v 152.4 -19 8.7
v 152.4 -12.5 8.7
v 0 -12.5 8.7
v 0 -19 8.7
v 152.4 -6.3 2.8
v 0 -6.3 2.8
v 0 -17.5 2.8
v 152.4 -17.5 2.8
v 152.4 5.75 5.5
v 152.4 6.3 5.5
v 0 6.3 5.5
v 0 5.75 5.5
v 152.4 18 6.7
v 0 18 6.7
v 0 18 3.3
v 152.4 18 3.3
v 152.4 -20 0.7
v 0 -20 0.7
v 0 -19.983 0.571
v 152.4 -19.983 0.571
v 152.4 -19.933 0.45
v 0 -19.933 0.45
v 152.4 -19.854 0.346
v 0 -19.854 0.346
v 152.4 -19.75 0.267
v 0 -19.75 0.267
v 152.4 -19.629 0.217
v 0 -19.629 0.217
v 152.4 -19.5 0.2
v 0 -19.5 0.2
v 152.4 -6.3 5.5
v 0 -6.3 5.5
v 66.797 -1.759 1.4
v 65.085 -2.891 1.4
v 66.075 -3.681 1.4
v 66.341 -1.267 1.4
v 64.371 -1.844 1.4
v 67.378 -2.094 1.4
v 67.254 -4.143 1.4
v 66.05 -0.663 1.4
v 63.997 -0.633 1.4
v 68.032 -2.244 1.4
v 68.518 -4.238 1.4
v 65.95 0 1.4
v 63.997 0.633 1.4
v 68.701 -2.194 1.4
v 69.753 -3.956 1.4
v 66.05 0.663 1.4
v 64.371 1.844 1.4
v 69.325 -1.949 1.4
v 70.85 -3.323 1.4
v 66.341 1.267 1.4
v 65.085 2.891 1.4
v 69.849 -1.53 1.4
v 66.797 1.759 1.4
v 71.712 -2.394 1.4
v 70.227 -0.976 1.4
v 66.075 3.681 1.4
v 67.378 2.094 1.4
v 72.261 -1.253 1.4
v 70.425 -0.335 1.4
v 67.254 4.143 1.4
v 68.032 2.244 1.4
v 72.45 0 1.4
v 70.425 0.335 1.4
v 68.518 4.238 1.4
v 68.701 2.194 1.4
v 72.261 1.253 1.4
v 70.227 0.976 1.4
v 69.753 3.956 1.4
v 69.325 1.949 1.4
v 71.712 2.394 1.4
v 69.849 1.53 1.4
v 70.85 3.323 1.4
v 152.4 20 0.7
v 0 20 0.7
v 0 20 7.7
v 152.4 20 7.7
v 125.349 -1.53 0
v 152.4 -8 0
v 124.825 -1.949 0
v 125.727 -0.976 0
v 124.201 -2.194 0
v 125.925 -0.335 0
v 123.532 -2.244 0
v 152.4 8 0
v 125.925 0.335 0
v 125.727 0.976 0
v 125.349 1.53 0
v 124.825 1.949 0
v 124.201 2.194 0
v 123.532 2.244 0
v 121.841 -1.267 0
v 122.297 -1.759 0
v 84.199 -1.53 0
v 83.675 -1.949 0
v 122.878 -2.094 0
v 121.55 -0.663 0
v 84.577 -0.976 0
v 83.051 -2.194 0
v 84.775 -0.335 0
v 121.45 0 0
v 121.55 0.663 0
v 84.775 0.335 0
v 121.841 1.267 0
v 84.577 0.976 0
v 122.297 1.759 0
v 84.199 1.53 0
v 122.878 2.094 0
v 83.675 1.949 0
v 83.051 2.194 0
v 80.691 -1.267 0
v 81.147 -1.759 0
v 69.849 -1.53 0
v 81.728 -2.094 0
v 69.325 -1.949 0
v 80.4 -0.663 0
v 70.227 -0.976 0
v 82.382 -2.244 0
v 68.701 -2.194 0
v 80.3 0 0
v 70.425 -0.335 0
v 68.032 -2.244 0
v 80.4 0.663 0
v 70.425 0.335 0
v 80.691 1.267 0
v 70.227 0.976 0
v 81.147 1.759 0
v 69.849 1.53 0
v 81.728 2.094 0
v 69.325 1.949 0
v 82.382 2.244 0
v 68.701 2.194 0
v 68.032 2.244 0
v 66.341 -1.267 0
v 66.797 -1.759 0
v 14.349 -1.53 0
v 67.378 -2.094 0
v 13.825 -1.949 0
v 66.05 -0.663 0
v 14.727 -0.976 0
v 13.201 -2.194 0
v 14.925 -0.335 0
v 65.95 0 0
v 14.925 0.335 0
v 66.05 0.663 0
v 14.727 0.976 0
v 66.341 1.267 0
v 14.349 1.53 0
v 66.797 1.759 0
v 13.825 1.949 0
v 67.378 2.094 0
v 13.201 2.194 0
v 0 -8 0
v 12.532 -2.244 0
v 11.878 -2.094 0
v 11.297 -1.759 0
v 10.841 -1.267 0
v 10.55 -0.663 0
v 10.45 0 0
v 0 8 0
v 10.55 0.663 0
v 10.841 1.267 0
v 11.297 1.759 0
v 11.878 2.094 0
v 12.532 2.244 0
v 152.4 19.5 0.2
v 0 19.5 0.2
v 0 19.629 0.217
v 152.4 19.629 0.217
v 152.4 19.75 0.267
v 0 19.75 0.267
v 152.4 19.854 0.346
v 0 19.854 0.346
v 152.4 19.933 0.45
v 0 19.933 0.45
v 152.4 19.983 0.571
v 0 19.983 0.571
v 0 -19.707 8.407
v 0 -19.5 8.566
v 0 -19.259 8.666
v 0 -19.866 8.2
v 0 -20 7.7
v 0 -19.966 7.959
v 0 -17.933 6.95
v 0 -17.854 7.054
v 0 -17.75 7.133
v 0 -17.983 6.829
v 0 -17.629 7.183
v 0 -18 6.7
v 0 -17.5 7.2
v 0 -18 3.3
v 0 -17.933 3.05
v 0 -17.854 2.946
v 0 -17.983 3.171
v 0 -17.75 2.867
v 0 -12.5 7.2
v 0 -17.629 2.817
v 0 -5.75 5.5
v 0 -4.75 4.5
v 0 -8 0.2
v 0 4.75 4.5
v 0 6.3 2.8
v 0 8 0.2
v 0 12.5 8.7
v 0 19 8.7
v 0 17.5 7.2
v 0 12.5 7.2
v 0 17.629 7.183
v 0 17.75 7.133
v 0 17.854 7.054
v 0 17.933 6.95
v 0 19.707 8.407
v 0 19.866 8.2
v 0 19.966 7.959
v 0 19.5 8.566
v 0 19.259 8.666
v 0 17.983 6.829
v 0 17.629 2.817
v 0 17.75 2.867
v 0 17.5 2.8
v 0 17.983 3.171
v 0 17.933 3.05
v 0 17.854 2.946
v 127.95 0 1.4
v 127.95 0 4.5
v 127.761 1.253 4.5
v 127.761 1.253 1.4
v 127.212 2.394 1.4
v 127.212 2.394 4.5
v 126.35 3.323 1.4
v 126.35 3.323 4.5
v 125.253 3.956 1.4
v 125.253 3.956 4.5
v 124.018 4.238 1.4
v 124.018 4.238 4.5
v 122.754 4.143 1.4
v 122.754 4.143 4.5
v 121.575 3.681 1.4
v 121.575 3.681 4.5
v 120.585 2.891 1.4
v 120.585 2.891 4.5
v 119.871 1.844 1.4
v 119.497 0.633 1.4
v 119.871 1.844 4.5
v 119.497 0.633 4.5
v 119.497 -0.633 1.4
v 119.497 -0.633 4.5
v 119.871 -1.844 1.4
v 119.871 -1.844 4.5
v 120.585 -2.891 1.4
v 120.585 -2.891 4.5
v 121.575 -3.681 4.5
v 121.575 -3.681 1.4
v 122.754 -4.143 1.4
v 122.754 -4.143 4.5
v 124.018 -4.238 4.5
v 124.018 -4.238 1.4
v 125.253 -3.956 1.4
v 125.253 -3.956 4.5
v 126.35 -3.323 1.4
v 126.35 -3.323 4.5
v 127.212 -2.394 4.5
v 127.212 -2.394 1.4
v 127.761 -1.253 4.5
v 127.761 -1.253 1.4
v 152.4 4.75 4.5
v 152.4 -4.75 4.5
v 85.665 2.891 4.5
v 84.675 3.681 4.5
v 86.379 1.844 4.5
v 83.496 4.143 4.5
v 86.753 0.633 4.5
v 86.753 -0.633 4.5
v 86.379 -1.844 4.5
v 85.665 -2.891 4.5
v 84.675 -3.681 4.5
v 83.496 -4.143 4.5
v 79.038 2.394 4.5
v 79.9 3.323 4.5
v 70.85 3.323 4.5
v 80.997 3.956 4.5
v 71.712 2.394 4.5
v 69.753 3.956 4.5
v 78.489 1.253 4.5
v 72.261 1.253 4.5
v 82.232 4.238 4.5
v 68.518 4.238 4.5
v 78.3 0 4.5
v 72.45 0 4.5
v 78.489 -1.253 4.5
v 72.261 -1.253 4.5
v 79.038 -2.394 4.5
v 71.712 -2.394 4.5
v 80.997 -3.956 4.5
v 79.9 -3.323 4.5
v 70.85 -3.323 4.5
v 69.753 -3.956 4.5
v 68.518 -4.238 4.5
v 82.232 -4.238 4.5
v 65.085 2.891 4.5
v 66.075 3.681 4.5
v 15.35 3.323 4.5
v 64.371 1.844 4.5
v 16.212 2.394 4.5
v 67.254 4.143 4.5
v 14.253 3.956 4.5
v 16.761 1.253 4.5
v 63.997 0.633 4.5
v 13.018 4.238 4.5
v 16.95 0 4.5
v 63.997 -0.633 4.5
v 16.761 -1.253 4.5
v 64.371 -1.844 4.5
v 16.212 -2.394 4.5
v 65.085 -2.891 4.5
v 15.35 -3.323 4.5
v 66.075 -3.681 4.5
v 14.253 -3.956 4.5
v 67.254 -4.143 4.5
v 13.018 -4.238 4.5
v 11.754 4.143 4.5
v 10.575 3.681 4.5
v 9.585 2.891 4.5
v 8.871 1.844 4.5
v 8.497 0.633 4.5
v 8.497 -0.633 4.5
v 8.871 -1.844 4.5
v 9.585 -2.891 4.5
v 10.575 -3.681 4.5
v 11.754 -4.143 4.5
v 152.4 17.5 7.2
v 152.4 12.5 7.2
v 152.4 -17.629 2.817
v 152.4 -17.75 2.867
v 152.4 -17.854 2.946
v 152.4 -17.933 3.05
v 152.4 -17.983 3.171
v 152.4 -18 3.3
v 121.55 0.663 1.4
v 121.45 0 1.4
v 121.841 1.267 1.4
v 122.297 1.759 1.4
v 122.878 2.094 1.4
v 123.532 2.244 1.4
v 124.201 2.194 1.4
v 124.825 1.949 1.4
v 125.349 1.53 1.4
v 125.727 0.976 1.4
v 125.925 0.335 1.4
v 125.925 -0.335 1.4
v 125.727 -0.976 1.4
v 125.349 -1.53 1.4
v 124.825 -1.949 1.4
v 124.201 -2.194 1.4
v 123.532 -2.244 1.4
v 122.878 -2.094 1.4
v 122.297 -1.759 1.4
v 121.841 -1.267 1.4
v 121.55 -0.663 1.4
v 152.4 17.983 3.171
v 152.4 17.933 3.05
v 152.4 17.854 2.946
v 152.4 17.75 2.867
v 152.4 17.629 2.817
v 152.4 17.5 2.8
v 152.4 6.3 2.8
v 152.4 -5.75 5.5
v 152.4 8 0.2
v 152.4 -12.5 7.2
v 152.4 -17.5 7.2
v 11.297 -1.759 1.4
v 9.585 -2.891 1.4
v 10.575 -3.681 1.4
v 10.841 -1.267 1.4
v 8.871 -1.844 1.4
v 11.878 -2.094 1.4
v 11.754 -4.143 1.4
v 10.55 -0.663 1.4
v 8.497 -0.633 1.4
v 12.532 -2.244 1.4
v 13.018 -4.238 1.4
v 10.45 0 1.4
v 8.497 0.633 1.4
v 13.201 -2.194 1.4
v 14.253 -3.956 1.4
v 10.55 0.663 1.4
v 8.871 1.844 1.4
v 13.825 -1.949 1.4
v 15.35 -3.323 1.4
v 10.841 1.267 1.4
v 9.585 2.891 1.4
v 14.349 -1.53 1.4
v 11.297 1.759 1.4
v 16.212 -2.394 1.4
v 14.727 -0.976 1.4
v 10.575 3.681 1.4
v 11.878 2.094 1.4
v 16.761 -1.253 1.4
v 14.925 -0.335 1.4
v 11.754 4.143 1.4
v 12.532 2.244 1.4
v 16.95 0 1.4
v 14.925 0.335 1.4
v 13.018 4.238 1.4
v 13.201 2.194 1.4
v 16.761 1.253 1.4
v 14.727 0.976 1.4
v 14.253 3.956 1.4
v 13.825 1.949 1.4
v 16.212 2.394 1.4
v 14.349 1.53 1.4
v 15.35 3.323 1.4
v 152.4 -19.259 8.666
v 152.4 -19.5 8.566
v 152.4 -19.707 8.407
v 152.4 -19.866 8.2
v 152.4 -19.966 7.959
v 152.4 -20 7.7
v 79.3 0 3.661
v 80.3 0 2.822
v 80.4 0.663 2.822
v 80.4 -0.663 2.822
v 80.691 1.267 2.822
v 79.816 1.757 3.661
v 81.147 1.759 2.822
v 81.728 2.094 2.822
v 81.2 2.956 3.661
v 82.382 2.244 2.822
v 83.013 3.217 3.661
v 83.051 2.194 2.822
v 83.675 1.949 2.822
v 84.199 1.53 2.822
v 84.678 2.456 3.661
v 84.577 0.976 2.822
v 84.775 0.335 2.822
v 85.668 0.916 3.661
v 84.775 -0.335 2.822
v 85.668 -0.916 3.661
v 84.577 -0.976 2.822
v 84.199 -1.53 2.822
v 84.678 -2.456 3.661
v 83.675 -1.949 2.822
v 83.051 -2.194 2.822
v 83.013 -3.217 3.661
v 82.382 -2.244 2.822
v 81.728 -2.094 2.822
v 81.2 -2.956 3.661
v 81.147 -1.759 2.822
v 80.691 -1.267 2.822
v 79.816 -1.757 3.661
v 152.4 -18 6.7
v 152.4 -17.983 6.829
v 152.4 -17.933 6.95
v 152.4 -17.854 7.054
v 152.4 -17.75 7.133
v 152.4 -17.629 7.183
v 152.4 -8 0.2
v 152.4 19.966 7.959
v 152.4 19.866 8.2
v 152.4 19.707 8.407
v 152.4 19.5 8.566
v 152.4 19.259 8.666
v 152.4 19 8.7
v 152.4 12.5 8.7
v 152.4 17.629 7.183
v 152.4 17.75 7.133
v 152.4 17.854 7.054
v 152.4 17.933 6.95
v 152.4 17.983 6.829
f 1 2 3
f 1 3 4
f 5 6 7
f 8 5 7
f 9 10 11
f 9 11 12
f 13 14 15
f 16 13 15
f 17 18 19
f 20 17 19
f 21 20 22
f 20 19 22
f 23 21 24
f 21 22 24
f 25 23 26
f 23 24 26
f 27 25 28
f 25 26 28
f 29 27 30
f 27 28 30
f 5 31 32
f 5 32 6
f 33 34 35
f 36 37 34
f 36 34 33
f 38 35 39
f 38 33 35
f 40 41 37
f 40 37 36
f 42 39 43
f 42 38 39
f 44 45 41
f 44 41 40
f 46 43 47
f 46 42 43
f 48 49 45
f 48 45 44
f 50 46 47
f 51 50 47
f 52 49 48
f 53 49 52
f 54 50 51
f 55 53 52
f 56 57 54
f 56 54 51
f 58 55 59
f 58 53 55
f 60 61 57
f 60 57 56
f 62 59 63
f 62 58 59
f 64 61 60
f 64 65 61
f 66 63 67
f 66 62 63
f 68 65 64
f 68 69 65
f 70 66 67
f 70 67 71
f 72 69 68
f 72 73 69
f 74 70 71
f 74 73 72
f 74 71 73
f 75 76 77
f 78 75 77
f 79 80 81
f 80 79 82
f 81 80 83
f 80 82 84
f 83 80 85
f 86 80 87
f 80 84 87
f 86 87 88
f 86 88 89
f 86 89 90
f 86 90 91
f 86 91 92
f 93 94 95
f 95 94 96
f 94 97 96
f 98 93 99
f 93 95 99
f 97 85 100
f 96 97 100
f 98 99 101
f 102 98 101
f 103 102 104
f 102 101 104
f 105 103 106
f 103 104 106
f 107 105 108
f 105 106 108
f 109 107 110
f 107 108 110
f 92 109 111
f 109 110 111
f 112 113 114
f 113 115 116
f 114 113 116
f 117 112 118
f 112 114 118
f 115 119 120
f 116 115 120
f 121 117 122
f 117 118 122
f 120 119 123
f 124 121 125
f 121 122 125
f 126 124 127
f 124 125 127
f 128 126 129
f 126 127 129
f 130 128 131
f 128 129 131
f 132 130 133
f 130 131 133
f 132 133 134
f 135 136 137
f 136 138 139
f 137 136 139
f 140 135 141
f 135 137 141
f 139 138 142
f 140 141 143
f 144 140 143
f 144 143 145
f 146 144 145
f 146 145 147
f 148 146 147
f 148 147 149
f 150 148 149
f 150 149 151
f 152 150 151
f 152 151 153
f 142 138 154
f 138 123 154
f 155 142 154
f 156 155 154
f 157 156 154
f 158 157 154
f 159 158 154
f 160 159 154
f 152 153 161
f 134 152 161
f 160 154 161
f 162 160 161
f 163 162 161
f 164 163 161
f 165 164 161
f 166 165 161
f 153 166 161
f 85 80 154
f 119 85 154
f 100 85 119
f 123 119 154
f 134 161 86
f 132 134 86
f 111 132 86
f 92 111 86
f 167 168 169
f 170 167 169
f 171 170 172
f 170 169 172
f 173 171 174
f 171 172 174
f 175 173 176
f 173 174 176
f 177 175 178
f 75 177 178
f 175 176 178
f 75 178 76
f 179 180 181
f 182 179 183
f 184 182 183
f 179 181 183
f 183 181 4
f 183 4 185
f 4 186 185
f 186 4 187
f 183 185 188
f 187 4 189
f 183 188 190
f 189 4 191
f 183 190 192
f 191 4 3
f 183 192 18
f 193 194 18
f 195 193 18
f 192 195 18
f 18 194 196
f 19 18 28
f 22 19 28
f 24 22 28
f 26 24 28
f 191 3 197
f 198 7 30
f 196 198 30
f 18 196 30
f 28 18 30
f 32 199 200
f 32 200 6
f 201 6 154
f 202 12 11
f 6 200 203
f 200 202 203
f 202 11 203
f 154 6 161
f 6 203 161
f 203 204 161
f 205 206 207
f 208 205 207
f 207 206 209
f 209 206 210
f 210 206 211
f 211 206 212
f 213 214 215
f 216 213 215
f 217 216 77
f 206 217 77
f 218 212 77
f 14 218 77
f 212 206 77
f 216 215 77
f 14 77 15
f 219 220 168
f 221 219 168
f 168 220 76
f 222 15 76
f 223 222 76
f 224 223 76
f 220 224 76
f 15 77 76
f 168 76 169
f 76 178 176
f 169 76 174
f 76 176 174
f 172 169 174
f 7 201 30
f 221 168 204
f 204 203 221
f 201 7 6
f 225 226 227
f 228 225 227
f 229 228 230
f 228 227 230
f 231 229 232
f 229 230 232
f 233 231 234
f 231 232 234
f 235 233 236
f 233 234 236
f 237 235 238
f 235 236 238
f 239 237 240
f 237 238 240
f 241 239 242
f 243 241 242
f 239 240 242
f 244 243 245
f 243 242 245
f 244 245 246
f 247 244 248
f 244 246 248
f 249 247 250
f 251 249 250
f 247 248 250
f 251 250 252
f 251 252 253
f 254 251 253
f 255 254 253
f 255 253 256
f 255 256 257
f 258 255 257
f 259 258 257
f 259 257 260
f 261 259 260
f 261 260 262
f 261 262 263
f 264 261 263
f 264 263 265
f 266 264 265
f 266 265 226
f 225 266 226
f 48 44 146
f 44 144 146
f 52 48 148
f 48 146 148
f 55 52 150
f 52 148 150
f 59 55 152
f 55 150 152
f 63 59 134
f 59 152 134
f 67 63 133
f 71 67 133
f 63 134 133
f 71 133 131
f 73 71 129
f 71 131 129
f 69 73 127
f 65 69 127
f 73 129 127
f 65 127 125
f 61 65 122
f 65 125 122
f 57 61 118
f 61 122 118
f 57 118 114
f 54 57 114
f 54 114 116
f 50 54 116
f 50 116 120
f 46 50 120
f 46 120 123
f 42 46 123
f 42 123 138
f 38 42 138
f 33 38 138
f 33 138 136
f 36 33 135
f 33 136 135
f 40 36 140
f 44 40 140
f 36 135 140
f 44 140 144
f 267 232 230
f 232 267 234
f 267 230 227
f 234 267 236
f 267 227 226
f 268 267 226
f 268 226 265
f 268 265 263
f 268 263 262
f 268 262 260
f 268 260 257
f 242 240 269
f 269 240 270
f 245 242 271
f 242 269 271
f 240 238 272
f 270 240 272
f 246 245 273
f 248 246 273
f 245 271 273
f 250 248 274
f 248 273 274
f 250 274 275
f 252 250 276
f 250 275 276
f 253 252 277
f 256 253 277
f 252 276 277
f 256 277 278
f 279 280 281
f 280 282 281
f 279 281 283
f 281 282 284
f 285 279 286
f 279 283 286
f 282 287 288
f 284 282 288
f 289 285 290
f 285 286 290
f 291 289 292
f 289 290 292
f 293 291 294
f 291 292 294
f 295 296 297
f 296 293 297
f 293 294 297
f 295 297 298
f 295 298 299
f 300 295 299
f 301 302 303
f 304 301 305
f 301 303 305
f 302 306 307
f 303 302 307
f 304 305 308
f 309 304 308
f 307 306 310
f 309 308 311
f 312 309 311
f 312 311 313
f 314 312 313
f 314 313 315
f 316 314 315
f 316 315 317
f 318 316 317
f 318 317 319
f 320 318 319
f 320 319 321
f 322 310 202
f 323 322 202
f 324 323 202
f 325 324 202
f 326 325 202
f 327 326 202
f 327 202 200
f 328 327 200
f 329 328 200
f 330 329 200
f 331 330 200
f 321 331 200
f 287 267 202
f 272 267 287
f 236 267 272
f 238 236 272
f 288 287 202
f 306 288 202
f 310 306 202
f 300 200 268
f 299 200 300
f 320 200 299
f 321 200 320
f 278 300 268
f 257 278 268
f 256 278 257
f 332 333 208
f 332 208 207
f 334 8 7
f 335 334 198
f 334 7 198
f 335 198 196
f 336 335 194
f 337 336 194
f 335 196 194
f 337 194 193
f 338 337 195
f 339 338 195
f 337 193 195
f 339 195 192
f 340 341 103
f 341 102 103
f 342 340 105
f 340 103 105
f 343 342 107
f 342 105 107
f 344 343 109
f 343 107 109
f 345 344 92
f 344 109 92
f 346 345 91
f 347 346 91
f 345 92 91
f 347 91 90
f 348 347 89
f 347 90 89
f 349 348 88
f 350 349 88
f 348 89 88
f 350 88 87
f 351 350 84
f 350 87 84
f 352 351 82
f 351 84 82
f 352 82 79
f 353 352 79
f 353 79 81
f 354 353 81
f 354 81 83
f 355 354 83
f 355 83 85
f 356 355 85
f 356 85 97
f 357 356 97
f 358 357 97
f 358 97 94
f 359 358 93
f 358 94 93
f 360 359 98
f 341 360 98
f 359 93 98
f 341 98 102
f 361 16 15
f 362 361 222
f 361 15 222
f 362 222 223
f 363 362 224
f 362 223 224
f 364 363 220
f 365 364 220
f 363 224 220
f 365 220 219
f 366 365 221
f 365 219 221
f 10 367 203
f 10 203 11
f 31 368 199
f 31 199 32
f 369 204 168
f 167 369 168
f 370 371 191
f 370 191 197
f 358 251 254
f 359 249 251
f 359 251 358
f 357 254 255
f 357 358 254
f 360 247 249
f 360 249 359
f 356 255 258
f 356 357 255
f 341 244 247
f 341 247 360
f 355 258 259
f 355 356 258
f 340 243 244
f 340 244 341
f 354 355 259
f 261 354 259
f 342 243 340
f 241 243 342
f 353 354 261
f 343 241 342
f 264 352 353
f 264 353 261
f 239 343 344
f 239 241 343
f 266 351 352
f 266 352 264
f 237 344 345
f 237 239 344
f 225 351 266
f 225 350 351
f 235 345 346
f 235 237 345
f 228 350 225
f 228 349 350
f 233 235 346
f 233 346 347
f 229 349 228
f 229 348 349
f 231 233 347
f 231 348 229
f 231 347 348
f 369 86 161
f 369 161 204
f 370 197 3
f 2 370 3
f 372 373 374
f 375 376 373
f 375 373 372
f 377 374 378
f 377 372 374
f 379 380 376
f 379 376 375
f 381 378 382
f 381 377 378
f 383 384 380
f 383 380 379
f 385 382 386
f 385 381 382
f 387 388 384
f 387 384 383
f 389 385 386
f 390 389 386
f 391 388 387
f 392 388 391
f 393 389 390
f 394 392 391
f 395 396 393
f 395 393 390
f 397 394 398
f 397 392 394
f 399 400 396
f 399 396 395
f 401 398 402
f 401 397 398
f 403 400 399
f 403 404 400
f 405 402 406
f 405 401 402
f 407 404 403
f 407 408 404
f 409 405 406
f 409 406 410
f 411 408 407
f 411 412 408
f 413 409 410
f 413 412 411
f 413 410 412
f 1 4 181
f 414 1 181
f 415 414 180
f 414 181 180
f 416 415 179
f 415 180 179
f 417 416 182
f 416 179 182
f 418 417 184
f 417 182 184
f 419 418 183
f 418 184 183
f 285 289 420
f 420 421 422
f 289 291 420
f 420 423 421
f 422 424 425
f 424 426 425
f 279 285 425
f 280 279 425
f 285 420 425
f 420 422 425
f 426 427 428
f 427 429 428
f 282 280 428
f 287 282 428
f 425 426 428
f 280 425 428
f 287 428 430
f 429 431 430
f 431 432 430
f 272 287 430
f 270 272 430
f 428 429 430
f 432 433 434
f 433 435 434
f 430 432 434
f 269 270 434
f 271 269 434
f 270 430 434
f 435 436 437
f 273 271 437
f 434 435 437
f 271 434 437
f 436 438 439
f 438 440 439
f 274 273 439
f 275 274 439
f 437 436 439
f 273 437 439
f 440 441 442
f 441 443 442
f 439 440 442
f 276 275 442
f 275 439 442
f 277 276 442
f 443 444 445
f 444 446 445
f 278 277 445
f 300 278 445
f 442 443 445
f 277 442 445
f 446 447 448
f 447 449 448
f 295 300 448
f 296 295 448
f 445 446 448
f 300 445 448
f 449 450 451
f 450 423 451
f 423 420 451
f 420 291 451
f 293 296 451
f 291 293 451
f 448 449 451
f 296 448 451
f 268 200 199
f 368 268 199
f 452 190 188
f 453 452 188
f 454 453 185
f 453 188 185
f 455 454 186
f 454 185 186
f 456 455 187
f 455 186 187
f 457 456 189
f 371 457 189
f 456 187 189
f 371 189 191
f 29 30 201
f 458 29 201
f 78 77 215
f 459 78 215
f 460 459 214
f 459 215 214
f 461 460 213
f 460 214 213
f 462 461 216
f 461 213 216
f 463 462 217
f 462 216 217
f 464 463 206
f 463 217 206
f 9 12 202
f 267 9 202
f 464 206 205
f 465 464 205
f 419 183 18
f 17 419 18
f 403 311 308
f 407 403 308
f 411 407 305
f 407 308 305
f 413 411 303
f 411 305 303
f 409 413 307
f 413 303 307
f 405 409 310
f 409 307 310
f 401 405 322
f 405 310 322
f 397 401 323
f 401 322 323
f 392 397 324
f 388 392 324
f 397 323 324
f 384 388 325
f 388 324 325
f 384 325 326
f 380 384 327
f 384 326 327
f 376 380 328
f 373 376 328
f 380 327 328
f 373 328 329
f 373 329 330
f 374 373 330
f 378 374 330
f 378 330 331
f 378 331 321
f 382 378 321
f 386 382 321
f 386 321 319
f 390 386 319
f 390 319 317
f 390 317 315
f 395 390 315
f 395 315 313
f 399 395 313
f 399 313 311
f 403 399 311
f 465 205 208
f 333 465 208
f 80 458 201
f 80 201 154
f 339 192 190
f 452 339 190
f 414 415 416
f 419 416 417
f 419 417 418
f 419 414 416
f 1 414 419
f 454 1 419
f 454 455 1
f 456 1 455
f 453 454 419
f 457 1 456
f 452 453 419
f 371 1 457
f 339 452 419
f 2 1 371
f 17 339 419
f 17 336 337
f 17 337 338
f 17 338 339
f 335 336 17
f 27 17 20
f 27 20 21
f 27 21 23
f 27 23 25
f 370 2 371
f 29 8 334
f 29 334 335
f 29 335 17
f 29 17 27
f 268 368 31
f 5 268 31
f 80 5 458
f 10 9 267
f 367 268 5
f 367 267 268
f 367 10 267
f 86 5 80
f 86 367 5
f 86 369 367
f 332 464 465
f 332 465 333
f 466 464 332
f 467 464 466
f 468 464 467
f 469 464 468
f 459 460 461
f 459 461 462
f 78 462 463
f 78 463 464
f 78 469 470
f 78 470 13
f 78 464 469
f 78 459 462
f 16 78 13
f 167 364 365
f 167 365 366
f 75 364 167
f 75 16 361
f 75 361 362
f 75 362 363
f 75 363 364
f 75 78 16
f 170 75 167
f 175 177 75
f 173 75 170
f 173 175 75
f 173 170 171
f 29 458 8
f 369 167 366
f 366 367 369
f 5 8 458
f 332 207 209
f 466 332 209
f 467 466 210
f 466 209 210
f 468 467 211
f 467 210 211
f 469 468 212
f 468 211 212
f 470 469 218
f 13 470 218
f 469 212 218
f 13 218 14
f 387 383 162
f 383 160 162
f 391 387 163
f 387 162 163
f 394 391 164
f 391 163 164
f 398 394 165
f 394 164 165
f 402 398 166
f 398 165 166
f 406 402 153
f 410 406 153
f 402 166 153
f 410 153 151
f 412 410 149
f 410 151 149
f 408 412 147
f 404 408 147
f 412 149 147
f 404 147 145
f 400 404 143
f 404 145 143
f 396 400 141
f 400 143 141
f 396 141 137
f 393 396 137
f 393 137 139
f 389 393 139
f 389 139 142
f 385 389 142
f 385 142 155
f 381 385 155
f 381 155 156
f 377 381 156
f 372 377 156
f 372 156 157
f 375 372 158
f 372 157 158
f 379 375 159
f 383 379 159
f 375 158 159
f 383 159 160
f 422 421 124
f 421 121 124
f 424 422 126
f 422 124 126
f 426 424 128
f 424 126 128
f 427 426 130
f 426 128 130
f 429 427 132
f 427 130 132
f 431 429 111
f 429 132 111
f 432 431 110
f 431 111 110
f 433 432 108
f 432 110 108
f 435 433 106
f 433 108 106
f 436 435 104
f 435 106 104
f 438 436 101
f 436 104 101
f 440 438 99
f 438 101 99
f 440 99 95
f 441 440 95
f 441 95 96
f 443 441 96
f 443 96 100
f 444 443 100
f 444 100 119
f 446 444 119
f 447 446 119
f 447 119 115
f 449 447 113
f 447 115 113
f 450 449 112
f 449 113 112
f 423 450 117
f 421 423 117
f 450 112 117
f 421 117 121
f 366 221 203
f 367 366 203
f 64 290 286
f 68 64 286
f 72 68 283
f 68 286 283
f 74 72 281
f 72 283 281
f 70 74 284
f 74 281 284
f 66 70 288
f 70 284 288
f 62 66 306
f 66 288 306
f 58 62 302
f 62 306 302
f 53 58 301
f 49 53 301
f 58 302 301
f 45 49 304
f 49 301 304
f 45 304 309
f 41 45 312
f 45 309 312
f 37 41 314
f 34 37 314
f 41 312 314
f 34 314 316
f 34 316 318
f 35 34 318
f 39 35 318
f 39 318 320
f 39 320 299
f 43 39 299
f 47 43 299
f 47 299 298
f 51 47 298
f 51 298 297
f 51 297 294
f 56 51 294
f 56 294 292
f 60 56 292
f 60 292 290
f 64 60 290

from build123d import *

# Parameters (mm, degrees)
BOSS_EXTRUDE1_DEPTH                                 = 152.4
CBORE_FOR_0_BINDING_HEAD_MACHINE_SCREW1_D           = 4.499991
CBORE_FOR_0_BINDING_HEAD_MACHINE_SCREW1_CBORE_D     = 8.5000084
CBORE_FOR_0_BINDING_HEAD_MACHINE_SCREW1_CBORE_DEPTH = 3.099999896
CSK_FOR_0_FLAT_HEAD_MACHINE_SCREW_100_D             = 4.499991
CSK_FOR_0_FLAT_HEAD_MACHINE_SCREW_100_CSINK_D       = 8.5000084
CSK_FOR_0_FLAT_HEAD_MACHINE_SCREW_100_CSINK_ANGLE   = 100


with BuildPart() as part:
    # Sketch1 → Boss-Extrude1 (new body)
    with BuildSketch(Plane(origin=(0, 0, 0), x_dir=(0, 0, -1), z_dir=(1, 0, 0))):
        with BuildLine():
            Line((-8.7, -12.5), (-8.7, -19))
            ThreePointArc((-8.7, -19), (-8.407106781, -19.707106781), (-7.7, -20))
            Line((-7.7, -20), (-0.7, -20))
            ThreePointArc((-0.7, -20), (-0.346446609, -19.853553391), (-0.2, -19.5))
            Line((-0.2, -19.5), (-0.2, -8))
            Line((-0.2, -8), (0, -8))
            Line((0, -8), (0, 8))
            Line((0, 8), (-0.2, 8))
            Line((-0.2, 8), (-0.2, 19.5))
            ThreePointArc((-0.2, 19.5), (-0.346446609, 19.853553391), (-0.7, 20))
            Line((-0.7, 20), (-7.7, 20))
            ThreePointArc((-7.7, 20), (-8.407106781, 19.707106781), (-8.7, 19))
            Line((-8.7, 19), (-8.7, 12.5))
            Line((-8.7, 12.5), (-7.2, 12.5))
            Line((-7.2, 12.5), (-7.2, 17.5))
            ThreePointArc((-7.2, 17.5), (-7.053553391, 17.853553391), (-6.7, 18))
            Line((-6.7, 18), (-3.3, 18))
            ThreePointArc((-3.3, 18), (-2.946446609, 17.853553391), (-2.8, 17.5))
            Line((-2.8, 17.5), (-2.8, 6.3))
            Line((-2.8, 6.3), (-5.5, 6.3))
            Line((-5.5, 6.3), (-5.5, 5.75))
            Line((-5.5, 5.75), (-4.5, 4.75))
            Line((-4.5, 4.75), (-4.5, -4.75))
            Line((-4.5, -4.75), (-5.5, -5.75))
            Line((-5.5, -5.75), (-5.5, -6.3))
            Line((-5.5, -6.3), (-2.8, -6.3))
            Line((-2.8, -6.3), (-2.8, -17.5))
            ThreePointArc((-2.8, -17.5), (-2.946446609, -17.853553391), (-3.3, -18))
            Line((-3.3, -18), (-6.7, -18))
            ThreePointArc((-6.7, -18), (-7.053553391, -17.853553391), (-7.2, -17.5))
            Line((-7.2, -17.5), (-7.2, -12.5))
            Line((-7.2, -12.5), (-8.7, -12.5))
        make_face()
    extrude(amount=BOSS_EXTRUDE1_DEPTH)

    # CBORE for #0 Binding Head Machine Screw1 (through all)
    with Locations(Plane.XY.offset(4.5)):
        with Locations((12.7, 0), (68.2, 0), (123.7, 0), (179.2, 0), (234.7, 0), (290.2, 0), (345.7, 0)):
            CounterBoreHole(CBORE_FOR_0_BINDING_HEAD_MACHINE_SCREW1_D / 2, CBORE_FOR_0_BINDING_HEAD_MACHINE_SCREW1_CBORE_D / 2, CBORE_FOR_0_BINDING_HEAD_MACHINE_SCREW1_CBORE_DEPTH)

    # CSK for #0 Flat Head Machine Screw (100)1 (through all)
    with Locations(Plane.XY.offset(4.5)):
        with Locations((82.55, 0)):
            CounterSinkHole(CSK_FOR_0_FLAT_HEAD_MACHINE_SCREW_100_D / 2, CSK_FOR_0_FLAT_HEAD_MACHINE_SCREW_100_CSINK_D / 2, counter_sink_angle=CSK_FOR_0_FLAT_HEAD_MACHINE_SCREW_100_CSINK_ANGLE)


solid = part.part
